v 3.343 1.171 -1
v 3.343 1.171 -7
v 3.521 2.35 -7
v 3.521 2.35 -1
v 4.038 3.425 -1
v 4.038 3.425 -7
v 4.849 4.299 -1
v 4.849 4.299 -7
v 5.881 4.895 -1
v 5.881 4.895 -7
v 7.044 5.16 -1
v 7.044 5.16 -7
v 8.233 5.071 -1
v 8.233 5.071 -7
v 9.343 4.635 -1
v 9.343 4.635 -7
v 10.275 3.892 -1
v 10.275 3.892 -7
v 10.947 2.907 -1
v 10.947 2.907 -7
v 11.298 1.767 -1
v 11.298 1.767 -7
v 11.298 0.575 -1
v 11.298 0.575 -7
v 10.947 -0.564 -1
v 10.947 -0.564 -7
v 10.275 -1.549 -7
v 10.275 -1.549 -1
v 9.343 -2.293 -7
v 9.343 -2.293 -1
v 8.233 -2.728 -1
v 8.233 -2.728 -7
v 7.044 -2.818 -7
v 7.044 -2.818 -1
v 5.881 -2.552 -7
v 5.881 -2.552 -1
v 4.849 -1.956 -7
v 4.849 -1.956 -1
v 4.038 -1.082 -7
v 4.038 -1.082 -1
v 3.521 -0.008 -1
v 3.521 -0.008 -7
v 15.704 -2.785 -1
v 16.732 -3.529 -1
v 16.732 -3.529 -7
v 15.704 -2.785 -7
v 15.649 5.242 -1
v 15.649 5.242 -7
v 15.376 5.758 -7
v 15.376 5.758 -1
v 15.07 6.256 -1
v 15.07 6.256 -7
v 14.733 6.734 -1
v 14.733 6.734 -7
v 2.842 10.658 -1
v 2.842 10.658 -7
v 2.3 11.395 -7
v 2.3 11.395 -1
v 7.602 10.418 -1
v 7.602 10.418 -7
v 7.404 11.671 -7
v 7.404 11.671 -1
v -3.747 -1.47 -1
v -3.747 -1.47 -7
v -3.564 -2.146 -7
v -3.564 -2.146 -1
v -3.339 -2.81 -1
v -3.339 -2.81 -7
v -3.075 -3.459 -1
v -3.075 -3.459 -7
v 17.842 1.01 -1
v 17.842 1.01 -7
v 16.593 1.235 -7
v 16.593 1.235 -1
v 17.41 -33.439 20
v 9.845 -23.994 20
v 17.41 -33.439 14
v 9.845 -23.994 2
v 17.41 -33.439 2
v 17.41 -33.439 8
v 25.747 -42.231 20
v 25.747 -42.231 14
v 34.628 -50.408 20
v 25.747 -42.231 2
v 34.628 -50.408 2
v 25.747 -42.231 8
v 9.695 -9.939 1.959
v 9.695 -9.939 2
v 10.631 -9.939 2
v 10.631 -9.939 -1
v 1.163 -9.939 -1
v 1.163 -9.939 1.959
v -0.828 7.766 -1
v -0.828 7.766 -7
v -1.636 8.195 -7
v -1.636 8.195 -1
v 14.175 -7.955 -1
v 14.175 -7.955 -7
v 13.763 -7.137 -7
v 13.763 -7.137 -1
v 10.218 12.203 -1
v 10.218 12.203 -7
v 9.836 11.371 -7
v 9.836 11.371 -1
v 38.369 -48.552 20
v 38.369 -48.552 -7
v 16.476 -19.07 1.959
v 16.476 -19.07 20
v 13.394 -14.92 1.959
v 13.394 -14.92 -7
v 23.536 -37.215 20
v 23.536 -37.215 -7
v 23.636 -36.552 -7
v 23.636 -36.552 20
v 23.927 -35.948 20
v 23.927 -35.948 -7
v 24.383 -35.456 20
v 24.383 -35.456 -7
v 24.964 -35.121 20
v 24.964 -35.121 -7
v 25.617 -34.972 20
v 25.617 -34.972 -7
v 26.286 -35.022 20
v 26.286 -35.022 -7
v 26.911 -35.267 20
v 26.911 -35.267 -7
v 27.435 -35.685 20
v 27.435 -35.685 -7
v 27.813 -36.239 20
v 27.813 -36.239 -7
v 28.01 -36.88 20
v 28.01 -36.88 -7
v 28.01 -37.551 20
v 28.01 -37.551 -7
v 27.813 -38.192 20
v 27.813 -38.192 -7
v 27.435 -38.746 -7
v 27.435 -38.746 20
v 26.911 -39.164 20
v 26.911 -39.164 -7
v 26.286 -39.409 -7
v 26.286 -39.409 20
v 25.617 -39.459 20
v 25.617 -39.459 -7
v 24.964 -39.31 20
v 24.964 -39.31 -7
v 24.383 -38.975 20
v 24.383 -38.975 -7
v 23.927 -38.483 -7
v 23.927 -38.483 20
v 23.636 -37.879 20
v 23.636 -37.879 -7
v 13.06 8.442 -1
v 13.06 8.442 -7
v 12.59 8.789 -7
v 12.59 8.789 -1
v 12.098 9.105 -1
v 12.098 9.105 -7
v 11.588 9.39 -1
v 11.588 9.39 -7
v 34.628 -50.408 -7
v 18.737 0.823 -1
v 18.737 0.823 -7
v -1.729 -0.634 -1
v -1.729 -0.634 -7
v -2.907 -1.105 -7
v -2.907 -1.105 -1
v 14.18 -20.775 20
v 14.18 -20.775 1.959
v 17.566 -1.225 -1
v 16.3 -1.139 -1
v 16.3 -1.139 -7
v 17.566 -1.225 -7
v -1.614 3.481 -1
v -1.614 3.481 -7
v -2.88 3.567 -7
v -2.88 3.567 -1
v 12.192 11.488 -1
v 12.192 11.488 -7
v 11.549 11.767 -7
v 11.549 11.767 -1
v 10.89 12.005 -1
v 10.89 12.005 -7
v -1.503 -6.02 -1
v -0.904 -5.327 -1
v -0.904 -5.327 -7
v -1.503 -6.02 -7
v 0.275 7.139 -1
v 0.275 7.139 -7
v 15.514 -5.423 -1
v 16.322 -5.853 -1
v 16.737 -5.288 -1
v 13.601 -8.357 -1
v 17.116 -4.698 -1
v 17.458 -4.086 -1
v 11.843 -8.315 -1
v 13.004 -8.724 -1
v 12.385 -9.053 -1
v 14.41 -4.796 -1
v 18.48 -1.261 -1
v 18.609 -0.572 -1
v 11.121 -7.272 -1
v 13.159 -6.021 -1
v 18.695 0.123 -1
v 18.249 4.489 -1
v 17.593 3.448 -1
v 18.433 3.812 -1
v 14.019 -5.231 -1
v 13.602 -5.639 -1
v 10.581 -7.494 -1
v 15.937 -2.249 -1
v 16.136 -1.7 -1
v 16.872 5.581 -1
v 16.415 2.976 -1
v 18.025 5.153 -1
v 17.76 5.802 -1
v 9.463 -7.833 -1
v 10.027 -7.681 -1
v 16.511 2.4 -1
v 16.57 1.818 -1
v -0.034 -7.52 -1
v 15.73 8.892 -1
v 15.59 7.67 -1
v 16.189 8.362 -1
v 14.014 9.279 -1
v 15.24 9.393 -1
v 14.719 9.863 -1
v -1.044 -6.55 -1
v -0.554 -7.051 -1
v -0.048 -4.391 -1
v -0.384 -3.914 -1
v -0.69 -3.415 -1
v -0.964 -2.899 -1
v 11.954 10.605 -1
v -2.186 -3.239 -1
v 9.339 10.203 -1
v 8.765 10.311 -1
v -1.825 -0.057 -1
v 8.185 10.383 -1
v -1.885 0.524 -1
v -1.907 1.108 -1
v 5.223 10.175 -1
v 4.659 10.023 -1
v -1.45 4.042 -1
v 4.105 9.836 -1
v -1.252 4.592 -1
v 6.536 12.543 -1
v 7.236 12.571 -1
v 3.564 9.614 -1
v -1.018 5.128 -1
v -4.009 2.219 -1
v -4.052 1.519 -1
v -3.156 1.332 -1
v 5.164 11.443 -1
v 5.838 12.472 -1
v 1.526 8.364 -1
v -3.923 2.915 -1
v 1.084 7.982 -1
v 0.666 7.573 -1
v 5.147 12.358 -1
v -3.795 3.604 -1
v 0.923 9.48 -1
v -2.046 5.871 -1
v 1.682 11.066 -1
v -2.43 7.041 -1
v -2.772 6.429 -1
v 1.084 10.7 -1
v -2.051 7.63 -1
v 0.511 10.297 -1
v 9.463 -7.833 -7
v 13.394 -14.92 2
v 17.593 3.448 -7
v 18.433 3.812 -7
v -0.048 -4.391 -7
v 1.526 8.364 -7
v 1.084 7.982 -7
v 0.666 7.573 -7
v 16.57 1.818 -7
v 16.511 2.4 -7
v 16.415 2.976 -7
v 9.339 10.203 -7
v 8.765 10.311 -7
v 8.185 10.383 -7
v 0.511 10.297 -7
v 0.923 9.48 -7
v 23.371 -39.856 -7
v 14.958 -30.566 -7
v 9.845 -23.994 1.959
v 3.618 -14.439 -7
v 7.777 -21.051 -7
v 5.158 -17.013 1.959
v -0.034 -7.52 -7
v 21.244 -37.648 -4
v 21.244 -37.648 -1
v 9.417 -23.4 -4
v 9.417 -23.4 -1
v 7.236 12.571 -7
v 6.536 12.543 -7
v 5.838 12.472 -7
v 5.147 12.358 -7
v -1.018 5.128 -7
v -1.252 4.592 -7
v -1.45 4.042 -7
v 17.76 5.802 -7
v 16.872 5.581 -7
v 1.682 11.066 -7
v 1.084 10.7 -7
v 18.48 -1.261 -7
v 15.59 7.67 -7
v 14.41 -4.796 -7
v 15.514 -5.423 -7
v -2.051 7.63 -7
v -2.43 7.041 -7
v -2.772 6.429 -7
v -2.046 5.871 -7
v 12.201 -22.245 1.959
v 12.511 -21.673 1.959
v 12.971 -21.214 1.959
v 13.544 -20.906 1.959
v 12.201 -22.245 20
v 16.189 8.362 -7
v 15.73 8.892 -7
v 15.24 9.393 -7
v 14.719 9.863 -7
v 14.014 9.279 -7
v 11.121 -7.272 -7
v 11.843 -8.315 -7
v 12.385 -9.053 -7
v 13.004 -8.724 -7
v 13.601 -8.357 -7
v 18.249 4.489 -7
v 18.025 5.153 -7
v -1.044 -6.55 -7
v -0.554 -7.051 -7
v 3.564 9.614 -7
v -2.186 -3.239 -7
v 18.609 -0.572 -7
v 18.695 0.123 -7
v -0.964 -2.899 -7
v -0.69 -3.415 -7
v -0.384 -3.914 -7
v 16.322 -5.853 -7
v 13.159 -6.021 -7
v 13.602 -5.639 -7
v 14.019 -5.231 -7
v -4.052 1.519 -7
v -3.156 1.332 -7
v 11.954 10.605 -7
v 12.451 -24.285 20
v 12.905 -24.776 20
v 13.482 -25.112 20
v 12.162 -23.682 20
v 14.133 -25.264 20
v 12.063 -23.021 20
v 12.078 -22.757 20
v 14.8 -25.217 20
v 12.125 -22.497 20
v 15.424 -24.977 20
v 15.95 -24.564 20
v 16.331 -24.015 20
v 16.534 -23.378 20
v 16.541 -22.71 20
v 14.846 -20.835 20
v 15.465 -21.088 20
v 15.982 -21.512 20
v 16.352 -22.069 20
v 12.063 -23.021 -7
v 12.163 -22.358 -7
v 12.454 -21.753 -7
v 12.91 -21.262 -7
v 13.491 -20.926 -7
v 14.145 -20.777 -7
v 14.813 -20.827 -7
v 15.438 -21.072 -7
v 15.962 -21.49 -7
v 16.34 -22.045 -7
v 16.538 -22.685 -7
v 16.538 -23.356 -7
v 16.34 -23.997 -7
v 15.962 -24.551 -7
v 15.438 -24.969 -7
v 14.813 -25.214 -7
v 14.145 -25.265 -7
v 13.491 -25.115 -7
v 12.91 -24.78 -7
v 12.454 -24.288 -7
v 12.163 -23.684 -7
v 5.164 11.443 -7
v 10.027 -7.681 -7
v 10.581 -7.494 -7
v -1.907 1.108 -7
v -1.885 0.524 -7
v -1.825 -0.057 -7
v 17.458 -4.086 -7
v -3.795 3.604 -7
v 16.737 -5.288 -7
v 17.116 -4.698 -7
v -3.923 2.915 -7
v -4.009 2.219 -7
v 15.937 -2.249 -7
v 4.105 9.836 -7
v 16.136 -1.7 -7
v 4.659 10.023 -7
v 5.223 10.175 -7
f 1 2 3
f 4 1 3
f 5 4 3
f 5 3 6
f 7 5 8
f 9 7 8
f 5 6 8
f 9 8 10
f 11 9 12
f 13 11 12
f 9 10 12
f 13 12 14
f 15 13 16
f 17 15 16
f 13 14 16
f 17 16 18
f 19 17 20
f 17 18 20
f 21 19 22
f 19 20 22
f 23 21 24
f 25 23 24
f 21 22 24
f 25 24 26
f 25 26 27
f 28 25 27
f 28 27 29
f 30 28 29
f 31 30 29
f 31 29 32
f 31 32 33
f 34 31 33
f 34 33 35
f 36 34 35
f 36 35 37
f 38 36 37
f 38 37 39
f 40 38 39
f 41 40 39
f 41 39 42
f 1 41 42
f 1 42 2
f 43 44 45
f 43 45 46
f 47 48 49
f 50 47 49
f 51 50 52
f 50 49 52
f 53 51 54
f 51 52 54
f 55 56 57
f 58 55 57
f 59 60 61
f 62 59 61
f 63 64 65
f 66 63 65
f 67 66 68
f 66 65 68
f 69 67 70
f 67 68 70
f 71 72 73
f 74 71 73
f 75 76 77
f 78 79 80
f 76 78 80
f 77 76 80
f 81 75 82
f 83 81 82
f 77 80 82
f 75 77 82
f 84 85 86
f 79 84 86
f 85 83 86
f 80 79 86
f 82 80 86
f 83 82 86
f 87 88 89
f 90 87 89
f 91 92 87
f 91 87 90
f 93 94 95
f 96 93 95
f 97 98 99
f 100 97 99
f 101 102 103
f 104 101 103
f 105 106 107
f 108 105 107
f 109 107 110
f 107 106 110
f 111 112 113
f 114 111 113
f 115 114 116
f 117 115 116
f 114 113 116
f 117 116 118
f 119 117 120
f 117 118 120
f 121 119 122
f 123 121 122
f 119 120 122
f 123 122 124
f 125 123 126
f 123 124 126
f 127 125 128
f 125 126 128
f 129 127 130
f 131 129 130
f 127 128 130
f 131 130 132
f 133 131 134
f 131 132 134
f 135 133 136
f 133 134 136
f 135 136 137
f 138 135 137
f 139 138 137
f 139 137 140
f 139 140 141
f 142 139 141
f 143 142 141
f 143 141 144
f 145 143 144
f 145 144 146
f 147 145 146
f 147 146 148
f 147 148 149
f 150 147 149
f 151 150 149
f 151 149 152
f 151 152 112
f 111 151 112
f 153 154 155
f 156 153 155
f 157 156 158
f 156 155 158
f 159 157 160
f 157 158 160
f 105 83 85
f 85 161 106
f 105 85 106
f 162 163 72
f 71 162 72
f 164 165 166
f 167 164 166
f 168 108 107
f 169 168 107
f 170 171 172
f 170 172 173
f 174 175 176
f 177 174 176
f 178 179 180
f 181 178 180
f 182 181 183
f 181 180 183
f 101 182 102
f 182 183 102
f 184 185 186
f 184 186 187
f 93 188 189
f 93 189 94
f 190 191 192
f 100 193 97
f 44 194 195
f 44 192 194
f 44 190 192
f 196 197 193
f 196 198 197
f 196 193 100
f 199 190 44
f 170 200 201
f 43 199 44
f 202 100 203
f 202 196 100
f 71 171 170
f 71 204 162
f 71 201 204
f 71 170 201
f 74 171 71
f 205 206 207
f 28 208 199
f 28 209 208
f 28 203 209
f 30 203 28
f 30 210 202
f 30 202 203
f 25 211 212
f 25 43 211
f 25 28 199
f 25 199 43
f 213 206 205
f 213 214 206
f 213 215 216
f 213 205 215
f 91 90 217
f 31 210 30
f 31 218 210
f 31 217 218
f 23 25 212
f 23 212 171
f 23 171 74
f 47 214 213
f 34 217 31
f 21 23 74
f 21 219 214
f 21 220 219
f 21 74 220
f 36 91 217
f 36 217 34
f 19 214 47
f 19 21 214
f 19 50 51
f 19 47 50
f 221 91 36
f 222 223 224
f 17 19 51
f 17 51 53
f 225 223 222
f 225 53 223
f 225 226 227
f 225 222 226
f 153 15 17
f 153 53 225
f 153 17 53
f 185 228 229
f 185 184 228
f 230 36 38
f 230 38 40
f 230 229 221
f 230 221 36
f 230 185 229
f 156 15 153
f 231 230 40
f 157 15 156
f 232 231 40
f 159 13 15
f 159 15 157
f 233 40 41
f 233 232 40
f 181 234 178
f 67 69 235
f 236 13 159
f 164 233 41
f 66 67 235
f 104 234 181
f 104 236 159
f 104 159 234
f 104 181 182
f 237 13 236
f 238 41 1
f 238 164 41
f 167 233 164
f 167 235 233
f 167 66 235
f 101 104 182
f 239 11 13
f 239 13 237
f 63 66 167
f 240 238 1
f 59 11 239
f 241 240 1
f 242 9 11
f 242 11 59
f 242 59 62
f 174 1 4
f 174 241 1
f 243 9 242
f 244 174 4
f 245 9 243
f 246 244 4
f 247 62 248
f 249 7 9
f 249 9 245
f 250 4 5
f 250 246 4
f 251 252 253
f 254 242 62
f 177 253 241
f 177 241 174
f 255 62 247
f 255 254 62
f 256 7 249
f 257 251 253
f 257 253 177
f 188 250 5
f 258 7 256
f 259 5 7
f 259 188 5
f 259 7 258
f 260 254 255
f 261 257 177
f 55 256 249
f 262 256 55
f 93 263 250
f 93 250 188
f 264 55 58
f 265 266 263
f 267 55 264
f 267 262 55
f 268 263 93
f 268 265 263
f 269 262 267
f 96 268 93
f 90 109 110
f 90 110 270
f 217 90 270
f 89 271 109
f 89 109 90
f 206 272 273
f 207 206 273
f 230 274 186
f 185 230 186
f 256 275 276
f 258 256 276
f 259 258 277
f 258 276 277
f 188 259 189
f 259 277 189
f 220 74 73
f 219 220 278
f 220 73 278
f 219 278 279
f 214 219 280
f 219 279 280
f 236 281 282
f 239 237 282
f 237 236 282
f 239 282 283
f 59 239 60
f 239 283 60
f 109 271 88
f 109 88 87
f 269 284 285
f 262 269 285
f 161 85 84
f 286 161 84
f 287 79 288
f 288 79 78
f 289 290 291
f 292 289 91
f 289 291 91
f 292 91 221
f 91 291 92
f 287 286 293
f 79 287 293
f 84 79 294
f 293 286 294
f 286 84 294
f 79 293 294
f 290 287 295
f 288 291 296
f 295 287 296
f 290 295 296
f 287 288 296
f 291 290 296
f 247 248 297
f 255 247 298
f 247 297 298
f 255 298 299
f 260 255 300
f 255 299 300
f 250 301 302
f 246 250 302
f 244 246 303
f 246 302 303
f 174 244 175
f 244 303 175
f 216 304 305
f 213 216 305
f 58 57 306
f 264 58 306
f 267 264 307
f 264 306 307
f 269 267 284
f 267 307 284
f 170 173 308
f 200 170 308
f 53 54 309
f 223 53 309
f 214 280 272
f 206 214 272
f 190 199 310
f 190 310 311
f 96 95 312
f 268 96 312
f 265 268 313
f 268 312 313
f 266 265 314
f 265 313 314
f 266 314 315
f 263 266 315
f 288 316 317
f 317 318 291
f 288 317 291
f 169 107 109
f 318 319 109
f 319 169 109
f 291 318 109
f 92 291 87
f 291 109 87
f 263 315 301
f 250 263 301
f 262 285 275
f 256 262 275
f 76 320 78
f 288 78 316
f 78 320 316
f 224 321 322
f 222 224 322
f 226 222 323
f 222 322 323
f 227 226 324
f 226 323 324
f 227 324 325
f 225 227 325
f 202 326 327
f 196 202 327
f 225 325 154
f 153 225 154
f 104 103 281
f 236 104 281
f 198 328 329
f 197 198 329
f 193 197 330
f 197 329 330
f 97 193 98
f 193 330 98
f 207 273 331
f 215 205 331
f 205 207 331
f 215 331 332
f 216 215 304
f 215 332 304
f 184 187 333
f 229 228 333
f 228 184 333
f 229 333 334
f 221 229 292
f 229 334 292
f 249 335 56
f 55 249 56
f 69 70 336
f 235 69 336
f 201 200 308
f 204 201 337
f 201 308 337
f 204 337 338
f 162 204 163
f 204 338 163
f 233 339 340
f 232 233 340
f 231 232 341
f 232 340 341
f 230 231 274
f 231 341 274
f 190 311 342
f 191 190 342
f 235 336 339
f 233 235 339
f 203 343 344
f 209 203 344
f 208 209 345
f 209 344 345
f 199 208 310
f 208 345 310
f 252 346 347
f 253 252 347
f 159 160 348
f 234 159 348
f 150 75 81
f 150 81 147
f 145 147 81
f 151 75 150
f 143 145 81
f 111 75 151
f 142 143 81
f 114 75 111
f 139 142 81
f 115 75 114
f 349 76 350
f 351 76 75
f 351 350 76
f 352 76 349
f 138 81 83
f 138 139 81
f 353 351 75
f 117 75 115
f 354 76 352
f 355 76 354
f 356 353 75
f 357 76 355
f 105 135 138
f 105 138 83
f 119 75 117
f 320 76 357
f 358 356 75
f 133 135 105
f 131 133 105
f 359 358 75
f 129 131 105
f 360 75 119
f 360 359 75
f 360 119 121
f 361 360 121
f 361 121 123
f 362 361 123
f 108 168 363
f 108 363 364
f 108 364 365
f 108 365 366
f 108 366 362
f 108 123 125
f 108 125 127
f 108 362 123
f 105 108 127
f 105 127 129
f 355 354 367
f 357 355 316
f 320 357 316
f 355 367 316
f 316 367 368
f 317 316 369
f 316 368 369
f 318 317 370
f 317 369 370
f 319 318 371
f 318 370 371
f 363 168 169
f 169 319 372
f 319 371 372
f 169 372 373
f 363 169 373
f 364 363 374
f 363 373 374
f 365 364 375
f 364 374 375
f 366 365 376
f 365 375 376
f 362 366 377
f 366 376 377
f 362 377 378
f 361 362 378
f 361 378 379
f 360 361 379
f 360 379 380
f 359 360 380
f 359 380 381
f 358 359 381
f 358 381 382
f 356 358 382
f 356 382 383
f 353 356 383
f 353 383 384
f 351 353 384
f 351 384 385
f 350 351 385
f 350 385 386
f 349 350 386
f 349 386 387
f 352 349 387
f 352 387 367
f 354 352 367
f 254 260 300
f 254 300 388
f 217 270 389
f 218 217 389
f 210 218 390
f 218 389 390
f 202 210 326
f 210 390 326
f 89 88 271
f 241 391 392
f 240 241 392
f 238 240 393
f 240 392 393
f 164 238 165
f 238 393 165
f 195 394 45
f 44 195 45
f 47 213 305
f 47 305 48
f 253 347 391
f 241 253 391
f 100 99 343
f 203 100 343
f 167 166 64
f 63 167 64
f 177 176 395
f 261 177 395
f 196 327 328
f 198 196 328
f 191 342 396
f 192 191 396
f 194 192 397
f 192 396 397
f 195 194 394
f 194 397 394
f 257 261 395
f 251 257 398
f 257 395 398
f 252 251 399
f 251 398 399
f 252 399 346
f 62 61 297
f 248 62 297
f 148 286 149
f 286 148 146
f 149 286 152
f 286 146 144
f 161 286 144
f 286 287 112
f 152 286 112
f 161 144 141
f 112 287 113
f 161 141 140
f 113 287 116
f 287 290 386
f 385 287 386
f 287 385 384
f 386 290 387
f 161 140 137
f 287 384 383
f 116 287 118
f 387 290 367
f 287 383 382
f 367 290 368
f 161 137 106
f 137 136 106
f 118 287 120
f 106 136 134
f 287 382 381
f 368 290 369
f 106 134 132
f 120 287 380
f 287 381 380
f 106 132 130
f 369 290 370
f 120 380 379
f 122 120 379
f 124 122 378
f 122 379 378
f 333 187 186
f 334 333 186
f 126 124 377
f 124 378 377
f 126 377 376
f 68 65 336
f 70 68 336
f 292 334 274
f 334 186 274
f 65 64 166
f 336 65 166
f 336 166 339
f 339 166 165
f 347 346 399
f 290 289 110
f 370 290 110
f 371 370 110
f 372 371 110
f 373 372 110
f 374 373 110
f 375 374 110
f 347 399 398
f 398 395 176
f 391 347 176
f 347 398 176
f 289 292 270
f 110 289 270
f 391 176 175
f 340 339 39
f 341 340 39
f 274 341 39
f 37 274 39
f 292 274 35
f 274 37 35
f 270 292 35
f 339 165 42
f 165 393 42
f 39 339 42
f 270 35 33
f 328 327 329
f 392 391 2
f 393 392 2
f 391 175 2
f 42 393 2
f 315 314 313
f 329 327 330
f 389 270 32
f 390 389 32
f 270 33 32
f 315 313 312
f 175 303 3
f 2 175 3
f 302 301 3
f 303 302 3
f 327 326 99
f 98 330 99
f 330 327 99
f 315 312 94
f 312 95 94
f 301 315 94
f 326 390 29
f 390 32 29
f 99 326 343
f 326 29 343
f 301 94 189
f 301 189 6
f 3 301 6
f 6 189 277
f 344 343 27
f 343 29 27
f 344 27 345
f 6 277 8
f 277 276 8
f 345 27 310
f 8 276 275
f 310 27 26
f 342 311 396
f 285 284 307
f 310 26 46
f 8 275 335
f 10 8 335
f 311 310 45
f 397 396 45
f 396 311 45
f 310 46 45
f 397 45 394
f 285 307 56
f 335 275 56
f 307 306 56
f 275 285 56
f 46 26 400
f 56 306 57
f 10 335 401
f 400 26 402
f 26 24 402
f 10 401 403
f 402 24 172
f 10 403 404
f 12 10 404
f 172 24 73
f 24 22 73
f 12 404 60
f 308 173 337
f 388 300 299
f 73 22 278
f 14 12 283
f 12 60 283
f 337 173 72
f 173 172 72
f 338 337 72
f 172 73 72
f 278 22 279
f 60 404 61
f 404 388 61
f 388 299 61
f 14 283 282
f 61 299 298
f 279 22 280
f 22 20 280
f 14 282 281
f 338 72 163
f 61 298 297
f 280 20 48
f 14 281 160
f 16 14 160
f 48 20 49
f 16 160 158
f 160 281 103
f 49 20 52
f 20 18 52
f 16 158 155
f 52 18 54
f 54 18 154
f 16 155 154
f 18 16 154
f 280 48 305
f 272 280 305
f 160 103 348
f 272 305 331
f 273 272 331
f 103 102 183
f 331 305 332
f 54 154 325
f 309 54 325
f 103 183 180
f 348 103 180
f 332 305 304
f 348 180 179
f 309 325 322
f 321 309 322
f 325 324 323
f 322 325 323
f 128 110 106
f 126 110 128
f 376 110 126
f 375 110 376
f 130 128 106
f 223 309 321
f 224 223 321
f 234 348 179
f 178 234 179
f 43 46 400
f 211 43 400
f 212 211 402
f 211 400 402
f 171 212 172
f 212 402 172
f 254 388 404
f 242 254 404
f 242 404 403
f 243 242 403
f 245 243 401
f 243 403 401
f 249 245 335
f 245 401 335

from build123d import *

# Parameters (mm, degrees)
BOSS_EXTRUDE1_DEPTH      = 2
BOSS_EXTRUDE1_DEPTH_BACK = 7
BOSS_EXTRUDE3_DEPTH      = 9
SKETCH6_R                = 4
CUT_EXTRUDE1_DEPTH       = 18
BOSS_EXTRUDE4_DEPTH      = 18
SKETCH8_R                = 2.25
CUT_EXTRUDE2_DEPTH       = 69.863255609
CUT_EXTRUDE3_DEPTH       = 67.431528446
CUT_EXTRUDE3_DEPTH_BACK  = 67.431528446
SKETCH9_W                = 10.323299019
SKETCH9_H                = 27.481333942
SKETCH10_W               = 25.230248524
SKETCH10_H               = 17.693033904
CUT_EXTRUDE4_DEPTH       = 67.436499079


with BuildPart() as part:
    # Sketch2 → Boss-Extrude1 (new, two sides: drawn at the far end of the back side and taken through both)
    with BuildSketch(Plane.XY.offset(-BOSS_EXTRUDE1_DEPTH_BACK)):
        with BuildLine():
            Line((17.593003447, 3.447921134), (18.432689254, 3.812129579))
            ThreePointArc((18.432689254, 3.812129579), (18.142308848, 4.822341152), (17.760116965, 5.801513031))
            Line((17.760116965, 5.801513031), (16.871688472, 5.581479263))
            Line((16.871688472, 5.581479263), (15.649099733, 5.241598415))
            ThreePointArc((15.649099733, 5.241598415), (15.22663553, 6.009376293), (14.733410626, 6.733729845))
            Line((14.733410626, 6.733729845), (15.590096731, 7.669855443))
            Line((15.590096731, 7.669855443), (16.188603379, 8.362321932))
            ThreePointArc((16.188603379, 8.362321932), (15.488665299, 9.146499772), (14.719475556, 9.862876308))
            Line((14.719475556, 9.862876308), (14.014498216, 9.279158058))
            Line((14.014498216, 9.279158058), (13.060452596, 8.442474621))
            ThreePointArc((13.060452596, 8.442474621), (12.346699165, 8.950918239), (11.588033655, 9.389535972))
            Line((11.588033655, 9.389535972), (11.95371149, 10.604658163))
            Line((11.95371149, 10.604658163), (12.192497398, 11.488231214))
            ThreePointArc((12.192497398, 11.488231214), (11.221632964, 11.891059284), (10.217792822, 12.202753318))
            Line((10.217792822, 12.202753318), (9.835896044, 11.370963143))
            Line((9.835896044, 11.370963143), (9.33935398, 10.203192533))
            ThreePointArc((9.33935398, 10.203192533), (8.475678941, 10.351598396), (7.601835833, 10.417606691))
            Line((7.601835833, 10.417606691), (7.404078418, 11.671055622))
            Line((7.404078418, 11.671055622), (7.235849109, 12.570732756))
            ThreePointArc((7.235849109, 12.570732756), (6.18634993, 12.512426015), (5.14668224, 12.357702722))
            Line((5.14668224, 12.357702722), (5.163505363, 11.442586867))
            Line((5.163505363, 11.442586867), (5.222813101, 10.175020376))
            ThreePointArc((5.222813101, 10.175020376), (4.380277888, 9.933994883), (3.564332526, 9.614319987))
            Line((3.564332526, 9.614319987), (2.842308143, 10.657834724))
            Line((2.842308143, 10.657834724), (2.300383494, 11.395423851))
            ThreePointArc((2.300383494, 11.395423851), (1.380115753, 10.887530665), (0.510539453, 10.297034891))
            Line((0.510539453, 10.297034891), (0.922750452, 9.479843274))
            Line((0.922750452, 9.479843274), (1.526161366, 8.363537991))
            ThreePointArc((1.526161366, 8.363537991), (0.871640411, 7.780819197), (0.275200782, 7.138776643))
            Line((0.275200782, 7.138776643), (-0.828084785, 7.765676295))
            Line((-0.828084785, 7.765676295), (-1.636369952, 8.195088843))
            ThreePointArc((-1.636369952, 8.195088843), (-2.245135941, 7.338203686), (-2.772390602, 6.42889036))
            Line((-2.772390602, 6.42889036), (-2.04643517, 5.871477804))
            Line((-2.04643517, 5.871477804), (-1.018434012, 5.12753168))
            ThreePointArc((-1.018434012, 5.12753168), (-1.355304806, 4.318534189), (-1.61410652, 3.481288379))
            Line((-1.61410652, 3.481288379), (-2.880134034, 3.567407782))
            Line((-2.880134034, 3.567407782), (-3.794688927, 3.603593329))
            ThreePointArc((-3.794688927, 3.603593329), (-3.971379595, 2.567432815), (-4.051883364, 1.519402593))
            Line((-4.051883364, 1.519402593), (-3.155967876, 1.332171491))
            Line((-3.155967876, 1.332171491), (-1.90698471, 1.107932181))
            ThreePointArc((-1.90698471, 1.107932181), (-1.859483953, 0.232887867), (-1.729388897, -0.633734398))
            Line((-1.729388897, -0.633734398), (-2.907406081, -1.105452248))
            Line((-2.907406081, -1.105452248), (-3.747091888, -1.469660694))
            ThreePointArc((-3.747091888, -1.469660694), (-3.456711482, -2.479872267), (-3.0745196, -3.459044145))
            Line((-3.0745196, -3.459044145), (-2.186091107, -3.239010378))
            Line((-2.186091107, -3.239010378), (-0.963502367, -2.899129529))
            ThreePointArc((-0.963502367, -2.899129529), (-0.541038164, -3.666907408), (-0.047813261, -4.391260959))
            Line((-0.047813261, -4.391260959), (-0.904499365, -5.327386558))
            Line((-0.904499365, -5.327386558), (-1.503006014, -6.019853046))
            ThreePointArc((-1.503006014, -6.019853046), (-0.803067933, -6.804030887), (-0.03387819, -7.520407423))
            Line((-0.03387819, -7.520407423), (0.67109915, -6.936689172))
            Line((0.67109915, -6.936689172), (1.625144769, -6.100005735))
            ThreePointArc((1.625144769, -6.100005735), (2.3388982, -6.608449353), (3.097563711, -7.047067087))
            Line((3.097563711, -7.047067087), (2.731885876, -8.262189278))
            Line((2.731885876, -8.262189278), (2.493099968, -9.145762328))
            ThreePointArc((2.493099968, -9.145762328), (3.463964401, -9.548590398), (4.467804544, -9.860284433))
            Line((4.467804544, -9.860284433), (4.849701322, -9.028494257))
            Line((4.849701322, -9.028494257), (5.346243386, -7.860723648))
            ThreePointArc((5.346243386, -7.860723648), (6.209918425, -8.009129511), (7.083761533, -8.075137806))
            Line((7.083761533, -8.075137806), (7.281518948, -9.328586736))
            Line((7.281518948, -9.328586736), (7.449748257, -10.22826387))
            ThreePointArc((7.449748257, -10.22826387), (8.499247436, -10.16995713), (9.538915126, -10.015233837))
            Line((9.538915126, -10.015233837), (9.522092003, -9.100117982))
            Line((9.522092003, -9.100117982), (9.462784265, -7.83255149))
            ThreePointArc((9.462784265, -7.83255149), (10.305319478, -7.591525998), (11.12126484, -7.271851101))
            Line((11.12126484, -7.271851101), (11.843289223, -8.315365839))
            Line((11.843289223, -8.315365839), (12.385213872, -9.052954966))
            ThreePointArc((12.385213872, -9.052954966), (13.305481612, -8.54506178), (14.175057913, -7.954566005))
            Line((14.175057913, -7.954566005), (13.762846914, -7.137374389))
            Line((13.762846914, -7.137374389), (13.159436, -6.021069105))
            ThreePointArc((13.159436, -6.021069105), (13.813956955, -5.438350311), (14.410396584, -4.796307757))
            Line((14.410396584, -4.796307757), (15.513682151, -5.42320741))
            Line((15.513682151, -5.42320741), (16.321967317, -5.852619957))
            ThreePointArc((16.321967317, -5.852619957), (16.930733307, -4.9957348), (17.457987967, -4.086421474))
            Line((17.457987967, -4.086421474), (16.732032536, -3.529008918))
            Line((16.732032536, -3.529008918), (15.704031377, -2.785062794))
            ThreePointArc((15.704031377, -2.785062794), (16.040902172, -1.976065303), (16.299703886, -1.138819493))
            Line((16.299703886, -1.138819493), (17.565731399, -1.224938896))
            Line((17.565731399, -1.224938896), (18.480286292, -1.261124443))
            ThreePointArc((18.480286292, -1.261124443), (18.656976961, -0.22496393), (18.737480729, 0.823066292))
            Line((18.737480729, 0.823066292), (17.841565242, 1.010297394))
            Line((17.841565242, 1.010297394), (16.592582076, 1.234536705))
            ThreePointArc((16.592582076, 1.234536705), (16.545081318, 2.109581019), (16.414986263, 2.976203284))
            Line((16.414986263, 2.976203284), (17.593003447, 3.447921134))
        make_face()
    extrude(amount=BOSS_EXTRUDE1_DEPTH + BOSS_EXTRUDE1_DEPTH_BACK)

    # Sketch5 → Boss-Extrude3 (add)
    with BuildSketch(Plane.XY.offset(2)):
        with BuildLine():
            Line((34.627961915, -50.407866333), (38.369192873, -48.55177457))
            Line((38.369192873, -48.55177457), (13.393984011, -14.920355903))
            Line((13.393984011, -14.920355903), (9.462784265, -7.83255149))
            Line((9.462784265, -7.83255149), (0.865656202, -2.843190202))
            Line((0.865656202, -2.843190202), (-0.03387819, -7.520407423))
            add(Edge.make_bspline(
                [(34.627961915, -50.407866333), (20.737528927, -38.343464696), (7.957182105, -24.264537371), (-0.03387819, -7.520407423)],
                knots=[0, 0, 0, 0, 1, 1, 1, 1], degree=3))
        make_face()
    extrude(amount=-BOSS_EXTRUDE3_DEPTH)

    # Sketch6 → Cut-Extrude1 (cut)
    with BuildSketch(Plane(origin=(0, 0, -7), x_dir=(-1, 0, 0), z_dir=(0, 0, -1))):
        with Locations((-7.342798683, 1.171234443)):
            Circle(SKETCH6_R)
    extrude(amount=-CUT_EXTRUDE1_DEPTH, mode=Mode.SUBTRACT)

    # Sketch7 → Boss-Extrude4 (add)
    with BuildSketch(Plane.XY.offset(2)):
        with BuildLine():
            Line((34.627961915, -50.407866333), (38.369192873, -48.55177457))
            Line((38.369192873, -48.55177457), (13.393984011, -14.920355903))
            add(Edge.make_bspline(
                [(7.977955023, -21.345123668), (8.112113434, -15.921271934), (13.393984011, -14.920355903)],
                knots=[0, 0, 0, 1, 1, 1], degree=2))
            add(Edge.make_bspline(
                [(7.977955023, -21.345123668), (15.413845314, -32.210109704), (24.739621619, -41.819443715), (34.627961915, -50.407866333)],
                knots=[0.288118642, 0.288118642, 0.288118642, 0.288118642, 1, 1, 1, 1], degree=3))
        make_face()
    extrude(amount=BOSS_EXTRUDE4_DEPTH)

    # Sketch8 → Cut-Extrude2 (cut, through all)
    with BuildSketch(Plane(origin=(0, 0, -7), x_dir=(-1, 0, 0), z_dir=(0, 0, -1))):
        with Locations((-14.312794722, -23.020807584)):
            Circle(SKETCH8_R)
        with Locations((-25.785580409, -37.215397344)):
            Circle(SKETCH8_R)
    extrude(amount=-CUT_EXTRUDE2_DEPTH, mode=Mode.SUBTRACT)

    # Sketch9 → Cut-Extrude3 (cut, two sides: drawn at the far end of the back side and taken through both)
    with BuildSketch(Plane(origin=(0, 0, 0), x_dir=(0, 0, -1), z_dir=(1, 0, 0)).offset(-CUT_EXTRUDE3_DEPTH_BACK)):
        with Locations((-4.16164951, 3.801629666)):
            Rectangle(SKETCH9_W, SKETCH9_H)
    extrude(amount=CUT_EXTRUDE3_DEPTH + CUT_EXTRUDE3_DEPTH_BACK, mode=Mode.SUBTRACT)

    # Sketch10 → Cut-Extrude4 (cut, through all)
    with BuildSketch(Plane(origin=(1.491415785, 1.107548305, 0), x_dir=(0, 0, -1), z_dir=(0.8028367498889462, 0.5961989206865052, 0))):
        with Locations((-14.573721534, -16.286562524)):
            Rectangle(SKETCH10_W, SKETCH10_H)
    extrude(amount=-CUT_EXTRUDE4_DEPTH, mode=Mode.SUBTRACT)


solid = part.part
